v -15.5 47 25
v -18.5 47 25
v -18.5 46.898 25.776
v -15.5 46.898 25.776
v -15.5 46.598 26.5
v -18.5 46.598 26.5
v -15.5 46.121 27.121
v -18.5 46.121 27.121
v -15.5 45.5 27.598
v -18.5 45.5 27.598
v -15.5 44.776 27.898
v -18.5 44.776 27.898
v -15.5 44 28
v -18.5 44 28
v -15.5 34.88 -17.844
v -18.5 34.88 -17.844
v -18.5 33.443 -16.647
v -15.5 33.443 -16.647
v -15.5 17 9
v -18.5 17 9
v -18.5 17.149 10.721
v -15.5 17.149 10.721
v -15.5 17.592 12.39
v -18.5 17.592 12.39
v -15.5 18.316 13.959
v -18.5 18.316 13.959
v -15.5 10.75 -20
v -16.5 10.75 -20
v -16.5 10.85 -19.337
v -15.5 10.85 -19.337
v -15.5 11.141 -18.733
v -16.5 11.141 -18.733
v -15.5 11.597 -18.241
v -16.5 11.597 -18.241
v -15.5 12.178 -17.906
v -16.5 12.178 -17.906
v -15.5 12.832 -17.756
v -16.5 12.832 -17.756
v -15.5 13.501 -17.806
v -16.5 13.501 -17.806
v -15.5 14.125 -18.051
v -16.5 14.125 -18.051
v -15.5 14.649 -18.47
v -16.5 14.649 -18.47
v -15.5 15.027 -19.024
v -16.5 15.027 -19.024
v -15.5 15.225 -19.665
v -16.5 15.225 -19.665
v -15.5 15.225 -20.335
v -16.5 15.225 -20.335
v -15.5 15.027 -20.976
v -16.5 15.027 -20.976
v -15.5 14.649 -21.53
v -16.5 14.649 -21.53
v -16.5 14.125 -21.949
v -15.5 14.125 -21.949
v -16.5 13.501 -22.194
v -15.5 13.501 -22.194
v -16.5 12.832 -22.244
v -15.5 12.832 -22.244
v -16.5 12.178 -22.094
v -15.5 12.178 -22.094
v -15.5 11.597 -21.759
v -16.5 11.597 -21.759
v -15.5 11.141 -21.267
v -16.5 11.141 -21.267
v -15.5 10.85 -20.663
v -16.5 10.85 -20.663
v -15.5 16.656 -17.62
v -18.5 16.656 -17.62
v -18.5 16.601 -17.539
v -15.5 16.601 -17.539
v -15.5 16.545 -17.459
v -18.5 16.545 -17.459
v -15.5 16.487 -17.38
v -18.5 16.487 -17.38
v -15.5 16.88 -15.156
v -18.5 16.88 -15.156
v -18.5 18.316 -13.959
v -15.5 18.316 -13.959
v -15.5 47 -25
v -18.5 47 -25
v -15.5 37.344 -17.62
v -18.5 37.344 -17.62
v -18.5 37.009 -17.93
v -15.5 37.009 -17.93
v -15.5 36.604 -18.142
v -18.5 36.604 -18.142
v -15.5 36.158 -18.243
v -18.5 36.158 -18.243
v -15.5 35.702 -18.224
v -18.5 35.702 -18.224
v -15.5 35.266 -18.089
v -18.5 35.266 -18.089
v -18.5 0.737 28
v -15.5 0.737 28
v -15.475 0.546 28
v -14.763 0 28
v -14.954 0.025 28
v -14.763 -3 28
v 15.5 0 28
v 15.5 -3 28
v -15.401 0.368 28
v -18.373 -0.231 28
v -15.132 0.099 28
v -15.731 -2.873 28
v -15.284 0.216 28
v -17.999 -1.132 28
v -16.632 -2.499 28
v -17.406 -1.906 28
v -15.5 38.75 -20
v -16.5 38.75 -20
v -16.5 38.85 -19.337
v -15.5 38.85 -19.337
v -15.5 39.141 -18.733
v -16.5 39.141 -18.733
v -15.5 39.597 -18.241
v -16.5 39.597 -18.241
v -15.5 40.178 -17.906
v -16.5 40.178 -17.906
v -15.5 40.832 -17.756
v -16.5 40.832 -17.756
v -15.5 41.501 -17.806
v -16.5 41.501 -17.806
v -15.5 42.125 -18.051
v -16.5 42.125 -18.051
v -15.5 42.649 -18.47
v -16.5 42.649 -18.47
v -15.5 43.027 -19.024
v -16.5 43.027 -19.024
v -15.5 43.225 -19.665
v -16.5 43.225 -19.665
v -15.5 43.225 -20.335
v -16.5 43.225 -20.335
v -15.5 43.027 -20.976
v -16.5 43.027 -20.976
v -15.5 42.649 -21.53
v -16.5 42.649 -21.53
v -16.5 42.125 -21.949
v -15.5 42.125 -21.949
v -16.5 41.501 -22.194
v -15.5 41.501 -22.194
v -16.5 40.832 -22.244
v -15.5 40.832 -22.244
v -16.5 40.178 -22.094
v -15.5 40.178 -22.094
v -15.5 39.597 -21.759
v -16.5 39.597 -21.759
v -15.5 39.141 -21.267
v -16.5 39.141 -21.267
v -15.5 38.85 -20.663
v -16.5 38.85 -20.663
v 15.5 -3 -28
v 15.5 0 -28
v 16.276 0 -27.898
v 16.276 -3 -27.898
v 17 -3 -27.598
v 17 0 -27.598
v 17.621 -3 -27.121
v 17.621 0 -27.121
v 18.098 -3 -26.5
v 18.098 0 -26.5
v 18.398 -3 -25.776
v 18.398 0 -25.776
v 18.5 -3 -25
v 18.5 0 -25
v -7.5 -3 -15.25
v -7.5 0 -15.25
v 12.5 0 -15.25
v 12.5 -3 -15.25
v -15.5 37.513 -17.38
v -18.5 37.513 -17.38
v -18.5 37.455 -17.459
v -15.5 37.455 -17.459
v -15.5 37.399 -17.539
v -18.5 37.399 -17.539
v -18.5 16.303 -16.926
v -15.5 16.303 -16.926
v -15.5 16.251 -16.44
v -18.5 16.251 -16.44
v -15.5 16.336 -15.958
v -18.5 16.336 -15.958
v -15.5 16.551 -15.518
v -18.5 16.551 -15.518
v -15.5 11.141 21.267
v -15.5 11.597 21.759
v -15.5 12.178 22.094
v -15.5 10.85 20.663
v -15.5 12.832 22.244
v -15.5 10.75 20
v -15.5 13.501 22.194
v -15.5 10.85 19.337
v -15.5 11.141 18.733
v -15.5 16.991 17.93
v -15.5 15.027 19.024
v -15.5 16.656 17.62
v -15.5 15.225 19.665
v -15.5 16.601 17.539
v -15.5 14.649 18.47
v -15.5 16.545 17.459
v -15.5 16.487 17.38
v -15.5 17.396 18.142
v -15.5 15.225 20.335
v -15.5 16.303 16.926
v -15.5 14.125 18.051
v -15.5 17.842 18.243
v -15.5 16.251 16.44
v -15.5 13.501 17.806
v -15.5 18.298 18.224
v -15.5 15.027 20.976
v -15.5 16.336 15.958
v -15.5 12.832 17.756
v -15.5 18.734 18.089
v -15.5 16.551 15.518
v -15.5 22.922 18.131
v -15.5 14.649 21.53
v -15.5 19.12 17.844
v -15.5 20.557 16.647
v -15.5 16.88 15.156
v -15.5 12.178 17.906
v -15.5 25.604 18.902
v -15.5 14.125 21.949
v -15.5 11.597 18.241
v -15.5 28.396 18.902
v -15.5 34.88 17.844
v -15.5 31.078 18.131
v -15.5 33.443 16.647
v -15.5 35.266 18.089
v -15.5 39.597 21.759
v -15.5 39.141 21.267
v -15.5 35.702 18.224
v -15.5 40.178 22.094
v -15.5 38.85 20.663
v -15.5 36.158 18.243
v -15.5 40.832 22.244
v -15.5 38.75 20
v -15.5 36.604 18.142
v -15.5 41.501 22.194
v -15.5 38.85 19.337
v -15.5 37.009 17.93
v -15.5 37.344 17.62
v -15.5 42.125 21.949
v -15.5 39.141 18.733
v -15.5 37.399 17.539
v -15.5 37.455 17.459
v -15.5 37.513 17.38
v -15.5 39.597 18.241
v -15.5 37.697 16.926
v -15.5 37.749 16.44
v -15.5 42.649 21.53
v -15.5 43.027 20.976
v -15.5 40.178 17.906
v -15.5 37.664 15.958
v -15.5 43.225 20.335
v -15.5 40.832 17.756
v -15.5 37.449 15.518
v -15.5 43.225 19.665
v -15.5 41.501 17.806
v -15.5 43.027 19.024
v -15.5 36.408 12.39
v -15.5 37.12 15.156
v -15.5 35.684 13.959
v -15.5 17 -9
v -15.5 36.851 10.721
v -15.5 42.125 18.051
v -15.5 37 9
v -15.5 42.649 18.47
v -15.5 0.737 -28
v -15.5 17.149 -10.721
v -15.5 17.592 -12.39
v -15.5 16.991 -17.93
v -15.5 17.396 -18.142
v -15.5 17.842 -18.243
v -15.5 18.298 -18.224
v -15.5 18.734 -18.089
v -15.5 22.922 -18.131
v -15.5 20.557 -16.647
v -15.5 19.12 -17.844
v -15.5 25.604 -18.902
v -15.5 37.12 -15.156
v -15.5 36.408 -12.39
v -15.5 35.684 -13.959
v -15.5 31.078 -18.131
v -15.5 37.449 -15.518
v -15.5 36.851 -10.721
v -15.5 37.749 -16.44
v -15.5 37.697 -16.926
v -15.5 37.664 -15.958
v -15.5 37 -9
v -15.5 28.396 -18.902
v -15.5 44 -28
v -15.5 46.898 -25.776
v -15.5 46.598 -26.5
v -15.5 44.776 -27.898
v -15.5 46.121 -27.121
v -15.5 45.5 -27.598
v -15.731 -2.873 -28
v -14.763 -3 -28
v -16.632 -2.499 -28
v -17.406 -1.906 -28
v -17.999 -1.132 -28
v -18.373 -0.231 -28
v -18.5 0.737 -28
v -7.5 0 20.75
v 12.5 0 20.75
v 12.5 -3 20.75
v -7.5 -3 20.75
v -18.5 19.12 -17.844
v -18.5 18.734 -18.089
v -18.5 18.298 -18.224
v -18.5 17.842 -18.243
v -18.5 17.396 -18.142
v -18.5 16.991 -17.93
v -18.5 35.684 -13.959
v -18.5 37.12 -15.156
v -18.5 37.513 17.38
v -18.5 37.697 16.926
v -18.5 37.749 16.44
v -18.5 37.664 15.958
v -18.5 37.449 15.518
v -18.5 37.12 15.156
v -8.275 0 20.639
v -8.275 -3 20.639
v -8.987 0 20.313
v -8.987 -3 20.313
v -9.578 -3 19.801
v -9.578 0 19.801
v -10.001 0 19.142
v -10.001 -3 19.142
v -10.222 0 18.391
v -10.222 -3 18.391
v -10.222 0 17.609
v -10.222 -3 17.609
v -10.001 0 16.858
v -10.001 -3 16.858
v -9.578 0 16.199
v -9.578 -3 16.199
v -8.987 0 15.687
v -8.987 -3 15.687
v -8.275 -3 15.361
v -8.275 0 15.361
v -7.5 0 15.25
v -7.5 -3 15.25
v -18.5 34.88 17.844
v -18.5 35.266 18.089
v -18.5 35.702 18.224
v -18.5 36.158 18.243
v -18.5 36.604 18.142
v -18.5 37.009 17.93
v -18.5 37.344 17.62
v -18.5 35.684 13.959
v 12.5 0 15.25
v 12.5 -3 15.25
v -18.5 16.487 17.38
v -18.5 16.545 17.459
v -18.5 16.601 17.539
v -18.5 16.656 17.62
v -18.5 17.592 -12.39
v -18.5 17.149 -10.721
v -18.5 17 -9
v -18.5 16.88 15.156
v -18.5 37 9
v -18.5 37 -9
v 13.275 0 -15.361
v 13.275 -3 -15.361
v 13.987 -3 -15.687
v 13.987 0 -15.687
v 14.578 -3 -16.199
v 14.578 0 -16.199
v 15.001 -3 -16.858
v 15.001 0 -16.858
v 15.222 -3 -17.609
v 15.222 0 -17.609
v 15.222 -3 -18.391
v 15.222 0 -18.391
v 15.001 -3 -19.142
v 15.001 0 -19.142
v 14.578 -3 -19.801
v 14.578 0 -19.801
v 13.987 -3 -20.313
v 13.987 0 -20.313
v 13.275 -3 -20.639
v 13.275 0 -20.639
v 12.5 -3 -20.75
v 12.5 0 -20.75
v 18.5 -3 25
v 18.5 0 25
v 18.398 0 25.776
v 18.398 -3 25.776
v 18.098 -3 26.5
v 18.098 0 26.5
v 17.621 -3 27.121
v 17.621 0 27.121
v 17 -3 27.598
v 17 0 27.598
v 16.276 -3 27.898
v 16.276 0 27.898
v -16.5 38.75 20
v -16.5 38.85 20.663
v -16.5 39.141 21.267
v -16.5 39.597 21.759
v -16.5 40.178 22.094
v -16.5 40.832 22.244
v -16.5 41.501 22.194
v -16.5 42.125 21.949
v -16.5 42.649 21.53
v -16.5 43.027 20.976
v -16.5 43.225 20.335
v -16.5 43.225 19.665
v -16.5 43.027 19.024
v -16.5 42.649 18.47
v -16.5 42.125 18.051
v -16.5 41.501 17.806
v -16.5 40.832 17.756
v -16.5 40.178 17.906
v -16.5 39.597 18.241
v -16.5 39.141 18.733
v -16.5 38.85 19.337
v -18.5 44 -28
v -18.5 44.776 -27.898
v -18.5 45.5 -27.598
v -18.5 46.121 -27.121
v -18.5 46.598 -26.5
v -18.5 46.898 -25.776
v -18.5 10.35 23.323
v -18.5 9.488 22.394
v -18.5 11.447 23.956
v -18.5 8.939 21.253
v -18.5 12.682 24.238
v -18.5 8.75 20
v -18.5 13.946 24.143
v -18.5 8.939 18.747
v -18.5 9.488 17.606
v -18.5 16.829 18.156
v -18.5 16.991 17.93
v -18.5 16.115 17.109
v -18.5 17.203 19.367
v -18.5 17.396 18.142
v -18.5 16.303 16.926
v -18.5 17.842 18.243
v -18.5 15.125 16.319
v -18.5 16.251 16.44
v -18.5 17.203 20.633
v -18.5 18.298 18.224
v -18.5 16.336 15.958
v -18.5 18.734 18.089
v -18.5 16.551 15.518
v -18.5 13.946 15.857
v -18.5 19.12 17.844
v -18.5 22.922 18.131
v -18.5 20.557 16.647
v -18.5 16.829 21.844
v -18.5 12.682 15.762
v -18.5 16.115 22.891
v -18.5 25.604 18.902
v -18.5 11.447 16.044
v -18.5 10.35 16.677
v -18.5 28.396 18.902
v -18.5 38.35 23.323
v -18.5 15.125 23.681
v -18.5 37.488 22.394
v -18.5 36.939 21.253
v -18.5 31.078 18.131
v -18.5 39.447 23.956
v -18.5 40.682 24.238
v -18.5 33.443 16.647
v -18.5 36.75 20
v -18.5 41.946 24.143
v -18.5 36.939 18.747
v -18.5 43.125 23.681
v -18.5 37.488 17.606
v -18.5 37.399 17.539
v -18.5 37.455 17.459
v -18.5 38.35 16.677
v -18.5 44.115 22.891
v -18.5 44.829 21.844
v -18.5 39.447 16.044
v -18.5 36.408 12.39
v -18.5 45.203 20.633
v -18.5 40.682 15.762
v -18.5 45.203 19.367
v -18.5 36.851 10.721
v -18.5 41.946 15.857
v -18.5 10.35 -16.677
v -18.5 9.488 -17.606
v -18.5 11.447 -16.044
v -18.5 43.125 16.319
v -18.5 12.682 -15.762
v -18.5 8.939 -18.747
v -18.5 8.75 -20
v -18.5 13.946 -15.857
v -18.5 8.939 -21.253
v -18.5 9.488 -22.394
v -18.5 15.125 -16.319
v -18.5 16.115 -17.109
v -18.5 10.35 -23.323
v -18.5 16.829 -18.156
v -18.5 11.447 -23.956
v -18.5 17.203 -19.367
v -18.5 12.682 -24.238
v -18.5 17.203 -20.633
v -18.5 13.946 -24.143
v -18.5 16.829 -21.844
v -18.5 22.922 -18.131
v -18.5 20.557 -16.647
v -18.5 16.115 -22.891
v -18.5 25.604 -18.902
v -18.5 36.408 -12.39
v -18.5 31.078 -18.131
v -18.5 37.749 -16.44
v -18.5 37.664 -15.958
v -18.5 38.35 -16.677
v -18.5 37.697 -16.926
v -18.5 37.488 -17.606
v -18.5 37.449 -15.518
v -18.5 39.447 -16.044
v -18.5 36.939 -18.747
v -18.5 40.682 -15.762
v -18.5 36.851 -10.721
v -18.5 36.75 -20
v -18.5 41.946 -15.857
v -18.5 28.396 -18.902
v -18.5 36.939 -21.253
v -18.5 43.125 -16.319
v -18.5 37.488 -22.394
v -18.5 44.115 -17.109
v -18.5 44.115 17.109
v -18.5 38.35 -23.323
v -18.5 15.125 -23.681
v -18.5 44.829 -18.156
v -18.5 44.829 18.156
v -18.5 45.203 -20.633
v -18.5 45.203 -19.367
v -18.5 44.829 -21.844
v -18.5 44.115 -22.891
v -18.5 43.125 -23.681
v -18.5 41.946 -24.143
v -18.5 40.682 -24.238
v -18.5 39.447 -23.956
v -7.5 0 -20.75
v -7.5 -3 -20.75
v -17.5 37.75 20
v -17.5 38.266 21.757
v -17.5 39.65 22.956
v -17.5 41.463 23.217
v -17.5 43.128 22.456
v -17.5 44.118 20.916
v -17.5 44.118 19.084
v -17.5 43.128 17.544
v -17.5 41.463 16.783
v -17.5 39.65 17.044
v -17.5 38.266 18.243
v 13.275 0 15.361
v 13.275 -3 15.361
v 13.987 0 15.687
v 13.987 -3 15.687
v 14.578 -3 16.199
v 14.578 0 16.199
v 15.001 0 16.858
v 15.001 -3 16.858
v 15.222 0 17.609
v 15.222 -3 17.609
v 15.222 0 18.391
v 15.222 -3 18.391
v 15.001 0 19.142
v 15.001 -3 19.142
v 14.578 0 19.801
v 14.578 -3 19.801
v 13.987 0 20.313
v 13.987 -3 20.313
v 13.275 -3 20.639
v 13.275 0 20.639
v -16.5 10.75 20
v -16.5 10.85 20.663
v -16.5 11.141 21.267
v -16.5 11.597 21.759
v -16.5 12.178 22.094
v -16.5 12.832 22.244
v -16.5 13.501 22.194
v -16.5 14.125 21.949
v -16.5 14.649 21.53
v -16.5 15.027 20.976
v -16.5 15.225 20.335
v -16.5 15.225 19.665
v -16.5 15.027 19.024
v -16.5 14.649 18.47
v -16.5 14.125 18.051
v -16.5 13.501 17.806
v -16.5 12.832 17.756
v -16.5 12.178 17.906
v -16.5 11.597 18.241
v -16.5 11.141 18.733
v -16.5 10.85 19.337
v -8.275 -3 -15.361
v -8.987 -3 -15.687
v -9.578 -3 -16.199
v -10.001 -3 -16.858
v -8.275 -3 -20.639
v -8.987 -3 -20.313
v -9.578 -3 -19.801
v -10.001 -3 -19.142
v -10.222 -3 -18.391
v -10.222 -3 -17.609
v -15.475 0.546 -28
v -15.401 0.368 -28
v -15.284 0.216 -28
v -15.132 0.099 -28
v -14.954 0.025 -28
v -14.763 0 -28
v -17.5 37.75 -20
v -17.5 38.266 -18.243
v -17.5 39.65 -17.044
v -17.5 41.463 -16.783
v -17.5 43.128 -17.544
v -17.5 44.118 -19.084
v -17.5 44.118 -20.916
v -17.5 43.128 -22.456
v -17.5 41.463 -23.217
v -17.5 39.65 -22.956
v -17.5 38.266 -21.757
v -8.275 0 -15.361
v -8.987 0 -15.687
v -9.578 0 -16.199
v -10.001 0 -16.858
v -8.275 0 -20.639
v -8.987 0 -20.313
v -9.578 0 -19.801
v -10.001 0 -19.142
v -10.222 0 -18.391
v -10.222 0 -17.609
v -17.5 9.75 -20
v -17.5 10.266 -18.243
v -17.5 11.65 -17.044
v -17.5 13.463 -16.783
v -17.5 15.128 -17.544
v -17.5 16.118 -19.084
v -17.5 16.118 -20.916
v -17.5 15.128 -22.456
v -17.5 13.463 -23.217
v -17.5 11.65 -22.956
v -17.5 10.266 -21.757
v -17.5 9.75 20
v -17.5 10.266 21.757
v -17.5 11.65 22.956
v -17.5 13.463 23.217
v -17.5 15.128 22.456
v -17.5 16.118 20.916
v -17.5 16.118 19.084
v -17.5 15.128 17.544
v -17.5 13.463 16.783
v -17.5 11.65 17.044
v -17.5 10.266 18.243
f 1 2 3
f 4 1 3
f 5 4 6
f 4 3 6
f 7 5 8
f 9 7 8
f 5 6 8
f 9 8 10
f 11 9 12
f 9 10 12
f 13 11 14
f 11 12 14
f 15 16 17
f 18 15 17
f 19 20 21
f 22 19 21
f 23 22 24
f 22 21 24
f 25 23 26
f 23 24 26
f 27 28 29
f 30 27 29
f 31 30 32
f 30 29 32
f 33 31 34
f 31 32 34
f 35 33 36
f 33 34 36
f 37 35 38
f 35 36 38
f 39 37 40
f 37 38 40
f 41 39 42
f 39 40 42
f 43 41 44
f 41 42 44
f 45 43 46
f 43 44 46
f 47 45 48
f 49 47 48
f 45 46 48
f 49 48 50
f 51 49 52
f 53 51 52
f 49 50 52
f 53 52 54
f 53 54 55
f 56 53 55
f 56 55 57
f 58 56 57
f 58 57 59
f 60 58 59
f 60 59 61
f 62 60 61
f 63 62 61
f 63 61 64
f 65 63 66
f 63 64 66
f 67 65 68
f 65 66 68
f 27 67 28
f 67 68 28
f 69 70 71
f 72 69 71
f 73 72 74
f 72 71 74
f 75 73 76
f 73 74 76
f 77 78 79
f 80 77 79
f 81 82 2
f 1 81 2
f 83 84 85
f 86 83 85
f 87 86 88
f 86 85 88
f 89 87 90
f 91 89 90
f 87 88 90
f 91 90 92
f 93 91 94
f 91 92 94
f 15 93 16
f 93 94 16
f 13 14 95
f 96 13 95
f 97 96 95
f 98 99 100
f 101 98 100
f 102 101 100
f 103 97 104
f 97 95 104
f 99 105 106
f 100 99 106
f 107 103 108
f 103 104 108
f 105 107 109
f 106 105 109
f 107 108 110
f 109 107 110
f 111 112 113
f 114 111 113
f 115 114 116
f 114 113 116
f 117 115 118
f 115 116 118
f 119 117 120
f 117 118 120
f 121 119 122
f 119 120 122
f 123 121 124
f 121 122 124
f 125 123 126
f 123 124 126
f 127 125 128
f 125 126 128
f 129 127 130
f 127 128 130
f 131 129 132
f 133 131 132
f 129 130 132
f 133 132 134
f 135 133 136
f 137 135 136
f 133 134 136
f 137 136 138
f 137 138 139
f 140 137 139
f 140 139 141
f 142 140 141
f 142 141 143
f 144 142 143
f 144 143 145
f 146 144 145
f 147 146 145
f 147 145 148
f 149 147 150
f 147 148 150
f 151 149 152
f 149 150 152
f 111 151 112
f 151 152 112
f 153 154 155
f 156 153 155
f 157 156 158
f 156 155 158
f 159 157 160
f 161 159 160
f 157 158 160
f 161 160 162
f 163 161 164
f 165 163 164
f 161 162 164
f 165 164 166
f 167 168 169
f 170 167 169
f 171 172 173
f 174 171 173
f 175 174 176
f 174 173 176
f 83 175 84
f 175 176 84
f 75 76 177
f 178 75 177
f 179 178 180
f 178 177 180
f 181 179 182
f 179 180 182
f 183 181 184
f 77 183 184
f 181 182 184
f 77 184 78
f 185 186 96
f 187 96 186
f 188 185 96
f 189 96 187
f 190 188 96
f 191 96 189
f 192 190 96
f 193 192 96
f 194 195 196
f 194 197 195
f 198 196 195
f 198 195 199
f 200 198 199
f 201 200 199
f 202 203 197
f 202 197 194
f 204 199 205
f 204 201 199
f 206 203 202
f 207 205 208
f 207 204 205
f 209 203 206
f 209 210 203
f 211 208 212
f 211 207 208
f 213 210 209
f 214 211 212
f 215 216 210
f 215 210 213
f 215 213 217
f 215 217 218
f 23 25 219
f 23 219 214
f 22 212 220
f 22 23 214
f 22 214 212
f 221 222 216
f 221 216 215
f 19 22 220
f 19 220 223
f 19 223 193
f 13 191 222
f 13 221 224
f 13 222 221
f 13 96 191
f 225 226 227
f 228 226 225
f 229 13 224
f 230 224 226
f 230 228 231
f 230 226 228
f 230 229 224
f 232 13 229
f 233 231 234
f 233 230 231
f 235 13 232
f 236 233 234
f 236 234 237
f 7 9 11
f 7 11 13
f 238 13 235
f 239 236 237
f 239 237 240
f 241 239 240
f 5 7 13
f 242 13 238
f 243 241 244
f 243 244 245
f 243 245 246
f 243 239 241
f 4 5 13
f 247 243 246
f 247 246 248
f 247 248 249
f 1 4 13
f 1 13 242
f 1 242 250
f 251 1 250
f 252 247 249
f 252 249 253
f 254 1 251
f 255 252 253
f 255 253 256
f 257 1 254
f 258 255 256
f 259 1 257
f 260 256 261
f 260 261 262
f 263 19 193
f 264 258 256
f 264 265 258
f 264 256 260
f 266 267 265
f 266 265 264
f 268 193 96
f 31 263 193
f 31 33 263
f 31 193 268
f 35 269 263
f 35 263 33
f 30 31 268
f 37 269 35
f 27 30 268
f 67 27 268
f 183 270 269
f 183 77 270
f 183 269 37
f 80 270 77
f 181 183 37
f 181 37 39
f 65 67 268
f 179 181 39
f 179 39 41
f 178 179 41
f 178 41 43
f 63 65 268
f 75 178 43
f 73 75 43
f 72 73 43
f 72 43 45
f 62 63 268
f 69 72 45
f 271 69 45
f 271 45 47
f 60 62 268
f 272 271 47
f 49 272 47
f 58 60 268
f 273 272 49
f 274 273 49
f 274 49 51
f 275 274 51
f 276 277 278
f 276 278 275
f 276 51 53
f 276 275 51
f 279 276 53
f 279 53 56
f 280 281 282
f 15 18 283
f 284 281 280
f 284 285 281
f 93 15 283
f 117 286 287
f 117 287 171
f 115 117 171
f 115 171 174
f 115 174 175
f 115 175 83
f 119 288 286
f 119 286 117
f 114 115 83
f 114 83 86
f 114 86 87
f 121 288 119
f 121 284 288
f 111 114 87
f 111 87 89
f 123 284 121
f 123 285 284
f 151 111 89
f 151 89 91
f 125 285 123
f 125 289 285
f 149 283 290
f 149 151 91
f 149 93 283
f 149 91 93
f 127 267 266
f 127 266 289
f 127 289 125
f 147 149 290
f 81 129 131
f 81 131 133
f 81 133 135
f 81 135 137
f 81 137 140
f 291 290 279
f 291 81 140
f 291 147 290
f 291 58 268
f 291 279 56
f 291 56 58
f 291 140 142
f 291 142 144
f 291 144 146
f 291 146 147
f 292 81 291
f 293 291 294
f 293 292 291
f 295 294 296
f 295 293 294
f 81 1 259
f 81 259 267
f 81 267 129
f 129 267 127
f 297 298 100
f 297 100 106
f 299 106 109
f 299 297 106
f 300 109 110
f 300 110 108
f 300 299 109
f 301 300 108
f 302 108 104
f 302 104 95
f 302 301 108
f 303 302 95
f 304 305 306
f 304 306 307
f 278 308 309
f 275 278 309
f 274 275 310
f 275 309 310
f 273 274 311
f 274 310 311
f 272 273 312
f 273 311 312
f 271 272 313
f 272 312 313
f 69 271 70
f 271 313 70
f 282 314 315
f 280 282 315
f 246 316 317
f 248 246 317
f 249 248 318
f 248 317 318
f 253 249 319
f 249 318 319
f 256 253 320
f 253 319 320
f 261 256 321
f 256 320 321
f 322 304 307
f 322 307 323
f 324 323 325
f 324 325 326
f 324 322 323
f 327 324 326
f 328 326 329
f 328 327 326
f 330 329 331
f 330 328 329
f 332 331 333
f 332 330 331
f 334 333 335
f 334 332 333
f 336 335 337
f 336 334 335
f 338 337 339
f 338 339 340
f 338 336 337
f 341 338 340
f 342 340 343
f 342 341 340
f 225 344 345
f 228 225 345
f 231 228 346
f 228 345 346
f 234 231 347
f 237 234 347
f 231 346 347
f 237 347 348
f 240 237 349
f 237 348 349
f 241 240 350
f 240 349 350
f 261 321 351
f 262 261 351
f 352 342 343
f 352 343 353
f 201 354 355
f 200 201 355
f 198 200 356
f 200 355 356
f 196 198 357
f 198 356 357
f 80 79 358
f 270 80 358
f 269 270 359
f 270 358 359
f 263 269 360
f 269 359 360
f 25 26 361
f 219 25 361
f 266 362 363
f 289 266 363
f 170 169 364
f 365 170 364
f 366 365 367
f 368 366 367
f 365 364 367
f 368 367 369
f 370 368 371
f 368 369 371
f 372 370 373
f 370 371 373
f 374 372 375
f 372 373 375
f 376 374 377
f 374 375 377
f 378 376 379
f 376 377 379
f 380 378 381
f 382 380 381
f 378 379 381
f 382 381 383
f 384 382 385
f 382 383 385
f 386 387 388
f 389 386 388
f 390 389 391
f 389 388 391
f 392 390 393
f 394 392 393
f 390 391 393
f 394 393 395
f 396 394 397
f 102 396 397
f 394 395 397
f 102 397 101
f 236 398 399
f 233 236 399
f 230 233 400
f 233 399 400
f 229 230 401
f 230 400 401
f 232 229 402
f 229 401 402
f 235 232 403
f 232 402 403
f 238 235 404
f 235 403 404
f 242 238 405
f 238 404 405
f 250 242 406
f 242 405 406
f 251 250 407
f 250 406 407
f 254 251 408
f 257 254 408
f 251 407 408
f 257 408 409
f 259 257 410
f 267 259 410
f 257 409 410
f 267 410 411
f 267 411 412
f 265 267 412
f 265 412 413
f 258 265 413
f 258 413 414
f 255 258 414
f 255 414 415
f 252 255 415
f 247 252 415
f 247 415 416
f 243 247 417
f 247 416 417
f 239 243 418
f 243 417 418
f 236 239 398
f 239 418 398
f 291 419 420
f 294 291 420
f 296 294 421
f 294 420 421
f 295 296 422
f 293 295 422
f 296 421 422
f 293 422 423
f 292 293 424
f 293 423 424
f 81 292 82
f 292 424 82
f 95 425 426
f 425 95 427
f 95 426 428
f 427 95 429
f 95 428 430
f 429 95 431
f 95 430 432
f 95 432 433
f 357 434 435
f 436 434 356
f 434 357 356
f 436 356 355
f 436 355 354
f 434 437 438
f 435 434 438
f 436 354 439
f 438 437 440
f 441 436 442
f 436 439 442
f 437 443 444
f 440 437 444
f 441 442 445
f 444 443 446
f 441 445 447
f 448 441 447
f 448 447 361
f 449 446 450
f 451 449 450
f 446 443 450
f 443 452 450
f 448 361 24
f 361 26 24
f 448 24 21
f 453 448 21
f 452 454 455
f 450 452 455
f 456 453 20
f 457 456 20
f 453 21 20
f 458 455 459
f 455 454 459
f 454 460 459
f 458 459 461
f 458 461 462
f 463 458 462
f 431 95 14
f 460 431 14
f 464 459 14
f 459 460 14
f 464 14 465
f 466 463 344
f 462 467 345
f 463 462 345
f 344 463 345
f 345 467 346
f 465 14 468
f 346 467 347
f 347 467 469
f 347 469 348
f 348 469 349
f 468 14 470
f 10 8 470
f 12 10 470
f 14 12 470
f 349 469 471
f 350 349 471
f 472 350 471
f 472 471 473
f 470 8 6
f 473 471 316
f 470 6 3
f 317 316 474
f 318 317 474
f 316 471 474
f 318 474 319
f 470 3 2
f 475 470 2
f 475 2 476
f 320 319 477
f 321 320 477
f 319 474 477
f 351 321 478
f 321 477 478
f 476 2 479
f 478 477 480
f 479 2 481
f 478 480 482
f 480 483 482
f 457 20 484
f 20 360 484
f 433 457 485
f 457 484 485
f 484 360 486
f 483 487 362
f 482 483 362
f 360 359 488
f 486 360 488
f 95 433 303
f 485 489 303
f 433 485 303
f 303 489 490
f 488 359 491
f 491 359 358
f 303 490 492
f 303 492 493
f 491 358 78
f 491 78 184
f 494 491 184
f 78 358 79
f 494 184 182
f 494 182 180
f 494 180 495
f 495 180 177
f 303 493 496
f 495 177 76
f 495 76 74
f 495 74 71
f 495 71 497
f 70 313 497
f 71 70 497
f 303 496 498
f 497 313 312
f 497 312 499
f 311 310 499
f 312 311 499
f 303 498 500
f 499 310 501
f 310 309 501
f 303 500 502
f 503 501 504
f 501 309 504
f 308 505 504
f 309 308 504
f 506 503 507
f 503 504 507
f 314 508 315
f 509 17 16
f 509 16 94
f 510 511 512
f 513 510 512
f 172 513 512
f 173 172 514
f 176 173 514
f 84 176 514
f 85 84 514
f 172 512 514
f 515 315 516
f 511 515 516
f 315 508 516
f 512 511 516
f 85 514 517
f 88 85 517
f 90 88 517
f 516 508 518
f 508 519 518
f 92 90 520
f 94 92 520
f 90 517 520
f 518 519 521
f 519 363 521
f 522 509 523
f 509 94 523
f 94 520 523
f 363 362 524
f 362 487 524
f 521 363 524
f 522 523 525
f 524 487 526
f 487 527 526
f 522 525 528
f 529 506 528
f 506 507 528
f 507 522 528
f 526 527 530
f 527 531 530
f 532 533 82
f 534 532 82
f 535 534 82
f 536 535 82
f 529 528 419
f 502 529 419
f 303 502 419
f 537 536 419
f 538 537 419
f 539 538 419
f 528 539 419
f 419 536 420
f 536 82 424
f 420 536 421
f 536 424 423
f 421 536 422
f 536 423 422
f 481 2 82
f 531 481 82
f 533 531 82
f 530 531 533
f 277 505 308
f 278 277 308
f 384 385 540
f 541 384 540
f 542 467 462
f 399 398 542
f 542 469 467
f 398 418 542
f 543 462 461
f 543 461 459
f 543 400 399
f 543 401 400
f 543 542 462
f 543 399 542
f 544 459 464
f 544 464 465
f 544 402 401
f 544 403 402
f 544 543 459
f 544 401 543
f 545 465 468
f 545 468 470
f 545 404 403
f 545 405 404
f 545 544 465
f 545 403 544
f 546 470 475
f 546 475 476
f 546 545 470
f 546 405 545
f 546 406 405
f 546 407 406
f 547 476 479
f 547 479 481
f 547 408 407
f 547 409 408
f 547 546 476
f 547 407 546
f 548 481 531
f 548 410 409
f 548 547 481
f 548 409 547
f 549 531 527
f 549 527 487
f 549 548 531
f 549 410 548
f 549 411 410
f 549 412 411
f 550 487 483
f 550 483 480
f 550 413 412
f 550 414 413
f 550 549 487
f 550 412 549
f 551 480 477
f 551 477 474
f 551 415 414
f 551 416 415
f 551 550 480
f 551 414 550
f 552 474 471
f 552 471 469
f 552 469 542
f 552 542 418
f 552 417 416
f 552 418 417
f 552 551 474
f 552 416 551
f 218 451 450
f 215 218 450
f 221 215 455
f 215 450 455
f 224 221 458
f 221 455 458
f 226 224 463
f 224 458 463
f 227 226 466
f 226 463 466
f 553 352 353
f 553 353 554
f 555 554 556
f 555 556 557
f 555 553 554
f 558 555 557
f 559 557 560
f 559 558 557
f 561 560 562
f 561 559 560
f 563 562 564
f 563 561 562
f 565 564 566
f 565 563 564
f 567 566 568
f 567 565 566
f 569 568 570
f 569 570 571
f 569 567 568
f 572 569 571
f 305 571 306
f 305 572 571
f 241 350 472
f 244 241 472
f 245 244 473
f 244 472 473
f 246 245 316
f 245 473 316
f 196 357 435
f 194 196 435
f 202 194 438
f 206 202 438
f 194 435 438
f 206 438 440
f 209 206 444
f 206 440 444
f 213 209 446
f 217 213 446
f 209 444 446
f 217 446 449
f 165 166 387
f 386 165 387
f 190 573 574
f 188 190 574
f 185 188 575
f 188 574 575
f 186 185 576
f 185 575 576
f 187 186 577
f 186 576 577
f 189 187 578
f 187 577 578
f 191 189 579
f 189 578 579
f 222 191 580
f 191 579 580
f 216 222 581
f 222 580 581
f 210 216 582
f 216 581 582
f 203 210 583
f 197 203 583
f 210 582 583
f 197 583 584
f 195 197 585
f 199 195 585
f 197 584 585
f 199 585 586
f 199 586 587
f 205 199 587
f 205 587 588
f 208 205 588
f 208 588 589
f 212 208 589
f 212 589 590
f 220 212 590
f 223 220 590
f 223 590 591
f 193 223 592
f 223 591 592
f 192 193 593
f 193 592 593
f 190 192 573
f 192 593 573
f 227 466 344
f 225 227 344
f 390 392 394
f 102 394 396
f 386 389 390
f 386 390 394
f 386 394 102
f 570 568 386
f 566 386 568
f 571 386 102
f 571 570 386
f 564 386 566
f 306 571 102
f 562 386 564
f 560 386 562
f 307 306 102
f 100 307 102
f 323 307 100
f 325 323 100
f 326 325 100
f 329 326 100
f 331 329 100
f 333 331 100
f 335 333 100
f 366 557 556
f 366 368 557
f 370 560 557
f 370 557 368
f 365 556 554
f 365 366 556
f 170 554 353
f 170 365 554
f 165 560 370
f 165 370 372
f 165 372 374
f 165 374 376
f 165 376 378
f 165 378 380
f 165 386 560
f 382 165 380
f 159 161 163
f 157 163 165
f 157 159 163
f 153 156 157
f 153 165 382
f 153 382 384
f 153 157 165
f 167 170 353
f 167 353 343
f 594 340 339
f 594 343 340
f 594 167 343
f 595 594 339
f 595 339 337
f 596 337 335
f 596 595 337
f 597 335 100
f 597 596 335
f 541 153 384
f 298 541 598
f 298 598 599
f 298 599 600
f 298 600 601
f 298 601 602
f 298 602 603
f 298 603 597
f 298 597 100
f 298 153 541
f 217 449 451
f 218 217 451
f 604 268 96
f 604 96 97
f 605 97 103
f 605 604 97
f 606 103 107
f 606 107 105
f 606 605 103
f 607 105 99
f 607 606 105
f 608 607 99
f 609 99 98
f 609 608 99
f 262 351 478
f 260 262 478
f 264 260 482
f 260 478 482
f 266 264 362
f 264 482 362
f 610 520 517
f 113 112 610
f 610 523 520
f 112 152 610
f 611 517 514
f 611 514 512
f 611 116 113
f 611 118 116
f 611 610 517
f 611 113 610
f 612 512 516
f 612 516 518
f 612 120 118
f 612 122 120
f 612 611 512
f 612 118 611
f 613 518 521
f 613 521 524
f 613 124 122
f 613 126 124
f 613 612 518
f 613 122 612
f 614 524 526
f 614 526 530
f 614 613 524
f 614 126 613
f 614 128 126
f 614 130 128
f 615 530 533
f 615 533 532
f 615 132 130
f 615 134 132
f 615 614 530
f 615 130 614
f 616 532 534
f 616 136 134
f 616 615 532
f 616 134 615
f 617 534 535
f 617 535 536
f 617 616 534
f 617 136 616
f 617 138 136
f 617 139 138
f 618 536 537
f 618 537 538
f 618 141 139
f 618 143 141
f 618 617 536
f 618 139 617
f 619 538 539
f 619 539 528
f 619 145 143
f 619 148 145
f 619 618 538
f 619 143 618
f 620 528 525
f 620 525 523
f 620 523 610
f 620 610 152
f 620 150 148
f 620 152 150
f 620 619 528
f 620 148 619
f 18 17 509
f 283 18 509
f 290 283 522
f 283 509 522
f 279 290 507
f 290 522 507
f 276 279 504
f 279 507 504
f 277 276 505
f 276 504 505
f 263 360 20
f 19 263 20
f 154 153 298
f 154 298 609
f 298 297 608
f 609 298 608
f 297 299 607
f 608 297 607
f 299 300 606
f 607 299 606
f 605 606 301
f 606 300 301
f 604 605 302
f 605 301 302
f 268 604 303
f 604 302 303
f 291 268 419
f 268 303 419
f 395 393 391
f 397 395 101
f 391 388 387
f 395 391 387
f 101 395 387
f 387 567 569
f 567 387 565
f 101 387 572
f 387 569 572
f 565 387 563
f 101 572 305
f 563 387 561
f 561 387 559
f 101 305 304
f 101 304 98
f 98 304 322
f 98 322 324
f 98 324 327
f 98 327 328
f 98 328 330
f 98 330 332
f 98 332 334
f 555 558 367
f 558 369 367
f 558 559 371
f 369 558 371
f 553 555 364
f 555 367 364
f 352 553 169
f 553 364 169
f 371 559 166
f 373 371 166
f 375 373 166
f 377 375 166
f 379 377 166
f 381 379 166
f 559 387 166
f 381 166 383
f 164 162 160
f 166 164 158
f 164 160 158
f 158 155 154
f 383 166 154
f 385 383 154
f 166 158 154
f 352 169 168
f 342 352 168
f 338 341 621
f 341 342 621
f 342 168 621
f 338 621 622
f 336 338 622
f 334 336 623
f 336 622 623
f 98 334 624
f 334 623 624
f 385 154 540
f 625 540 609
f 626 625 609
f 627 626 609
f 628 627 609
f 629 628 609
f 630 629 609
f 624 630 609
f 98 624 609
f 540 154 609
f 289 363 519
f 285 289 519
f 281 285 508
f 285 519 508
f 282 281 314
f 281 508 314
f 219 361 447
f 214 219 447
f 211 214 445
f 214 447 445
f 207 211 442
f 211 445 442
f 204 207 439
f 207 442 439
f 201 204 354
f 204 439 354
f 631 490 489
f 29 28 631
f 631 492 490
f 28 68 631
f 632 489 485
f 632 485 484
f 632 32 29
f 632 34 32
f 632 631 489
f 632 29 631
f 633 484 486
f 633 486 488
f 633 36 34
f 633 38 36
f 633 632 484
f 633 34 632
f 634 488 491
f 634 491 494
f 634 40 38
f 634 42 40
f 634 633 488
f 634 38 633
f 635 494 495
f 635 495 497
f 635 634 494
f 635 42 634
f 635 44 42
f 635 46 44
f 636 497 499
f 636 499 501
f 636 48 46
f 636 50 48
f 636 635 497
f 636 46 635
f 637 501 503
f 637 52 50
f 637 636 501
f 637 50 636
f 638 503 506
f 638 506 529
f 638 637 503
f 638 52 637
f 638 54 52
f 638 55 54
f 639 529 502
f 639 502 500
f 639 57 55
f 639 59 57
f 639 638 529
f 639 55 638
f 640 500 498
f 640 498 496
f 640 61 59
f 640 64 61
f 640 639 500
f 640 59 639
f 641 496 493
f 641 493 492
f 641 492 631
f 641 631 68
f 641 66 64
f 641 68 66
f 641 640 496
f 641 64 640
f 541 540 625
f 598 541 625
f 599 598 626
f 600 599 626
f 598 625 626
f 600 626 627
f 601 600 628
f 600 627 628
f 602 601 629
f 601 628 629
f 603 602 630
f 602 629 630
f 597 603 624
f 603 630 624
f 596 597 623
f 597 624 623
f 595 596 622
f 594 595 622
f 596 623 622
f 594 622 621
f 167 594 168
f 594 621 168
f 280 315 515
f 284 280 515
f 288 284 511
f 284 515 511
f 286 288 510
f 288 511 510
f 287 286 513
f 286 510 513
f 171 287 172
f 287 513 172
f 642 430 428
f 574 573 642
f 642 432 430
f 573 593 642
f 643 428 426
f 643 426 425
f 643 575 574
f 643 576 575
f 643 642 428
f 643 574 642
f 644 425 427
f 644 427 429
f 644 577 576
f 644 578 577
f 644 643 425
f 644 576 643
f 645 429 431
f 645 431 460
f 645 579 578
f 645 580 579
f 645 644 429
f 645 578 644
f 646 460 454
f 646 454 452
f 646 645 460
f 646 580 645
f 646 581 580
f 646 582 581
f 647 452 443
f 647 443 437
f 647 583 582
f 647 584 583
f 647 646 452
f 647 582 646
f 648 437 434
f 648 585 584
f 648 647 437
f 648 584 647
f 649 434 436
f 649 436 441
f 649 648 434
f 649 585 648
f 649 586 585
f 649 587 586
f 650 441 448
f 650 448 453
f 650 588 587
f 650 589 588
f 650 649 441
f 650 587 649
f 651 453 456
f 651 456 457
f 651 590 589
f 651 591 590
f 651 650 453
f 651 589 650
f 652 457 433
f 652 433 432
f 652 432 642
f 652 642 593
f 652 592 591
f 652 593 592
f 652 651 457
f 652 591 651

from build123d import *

# Parameters (mm, degrees)
BASE_FLANGE1_DEPTH           = 3
EDGE_FLANGE1_STRIP_W         = 13.4732
EDGE_FLANGE1_STRIP_H         = 3
EDGE_FLANGE1_STRIP_CUT_DEPTH = 56
EDGE_FLANGE1_DEPTH           = 56
EDGE_FLANGE1_FLAT_DEPTH      = 3
SKETCH5_R                    = 2.25
CUT_EXTRUDE1_DEPTH           = 3
CHAMFER1_SIZE                = 2


# Sheet-metal steps are written as plain solids
with BuildPart() as part:
    # Sketch1 → Base-Flange1 (new body)
    with BuildSketch(Plane(origin=(0, 0, 0), x_dir=(1, 0, 0), z_dir=(0, 1, 0))):
        with BuildLine():
            Line((-18.5, 28), (15.5, 28))
            ThreePointArc((15.5, 28), (17.621320344, 27.121320344), (18.5, 25))
            Line((18.5, 25), (18.5, -25))
            ThreePointArc((18.5, -25), (17.621320344, -27.121320344), (15.5, -28))
            Line((15.5, -28), (-18.5, -28))
            Line((-18.5, -28), (-18.5, 28))
        make_face()
        with BuildLine():
            Line((-7.5, -15.25), (12.5, -15.25))
            ThreePointArc((12.5, -15.25), (15.25, -18), (12.5, -20.75))
            Line((12.5, -20.75), (-7.5, -20.75))
            ThreePointArc((-7.5, -20.75), (-10.25, -18), (-7.5, -15.25))
        make_face(mode=Mode.SUBTRACT)
        with BuildLine():
            Line((-7.5, 15.25), (12.5, 15.25))
            ThreePointArc((12.5, 15.25), (15.25, 18), (12.5, 20.75))
            Line((12.5, 20.75), (-7.5, 20.75))
            ThreePointArc((-7.5, 20.75), (-10.25, 18), (-7.5, 15.25))
        make_face(mode=Mode.SUBTRACT)
    extrude(amount=-BASE_FLANGE1_DEPTH)

    # Edge-Flange1 strip (across the edge) → Edge-Flange1 strip cut (cut)
    with BuildSketch(Plane(origin=(-18.5, 0, -28), x_dir=(1, 0, 0), z_dir=(0, 0, 1))):
        with Locations((-3, -1.5)):
            Rectangle(EDGE_FLANGE1_STRIP_W, EDGE_FLANGE1_STRIP_H)
    extrude(amount=EDGE_FLANGE1_STRIP_CUT_DEPTH, mode=Mode.SUBTRACT)

    # Edge-Flange1 bend section (across the edge) → Edge-Flange1 (add)
    with BuildSketch(Plane(origin=(-18.5, 0, -28), x_dir=(1, 0, 0), z_dir=(0, 0, 1))):
        with BuildLine():
            Line((0, 0.7366), (3, 0.7366))
            ThreePointArc((3, 0.7366), (3.215745145, 0.215745145), (3.7366, 0))
            Line((3.7366, 0), (3.7366, -3))
            ThreePointArc((3.7366, -3), (1.094424801, -1.905575199), (0, 0.7366))
        make_face()
    extrude(amount=EDGE_FLANGE1_DEPTH)

    # Edge-Flange1 profile (on flange) → Edge-Flange1 flat (add)
    with BuildSketch(Plane(origin=(-18.5, 0, 0), x_dir=(0, 0, -1), z_dir=(1, 0, 0))):
        with BuildLine():
            Line((-28, 0.7366), (28, 0.7366))
            Line((28, 0.7366), (28, 44))
            ThreePointArc((28, 44), (27.121320344, 46.121320344), (25, 47))
            Line((25, 47), (-25, 47))
            ThreePointArc((-25, 47), (-27.121320344, 46.121320344), (-28, 44))
            Line((-28, 44), (-28, 0.7366))
        make_face()
    extrude(amount=EDGE_FLANGE1_FLAT_DEPTH)

    # Sketch5 → Cut-Extrude1 (cut)
    with BuildSketch(Plane.ZY.offset(18.5)):
        with BuildLine():
            Line((9, 37), (-9, 37))
            ThreePointArc((-9, 37), (-11.565163819, 36.665398832), (-13.958666275, 35.683986917))
            Line((-13.958666275, 35.683986917), (-15.155612761, 37.120322699))
            ThreePointArc((-15.155612761, 37.120322699), (-16.195875666, 37.723371228), (-17.379716482, 37.512811591))
            ThreePointArc((-17.379716482, 37.512811591), (-17.498601644, 37.426573777), (-17.620322699, 37.344387239))
            ThreePointArc((-17.620322699, 37.344387239), (-18.242813111, 36.158437556), (-17.844387239, 34.879677301))
            Line((-17.844387239, 34.879677301), (-16.647440754, 33.443341518))
            ThreePointArc((-16.647440754, 33.443341518), (-19, 27), (-16.647440754, 20.556658482))
            Line((-16.647440754, 20.556658482), (-17.844387239, 19.120322699))
            ThreePointArc((-17.844387239, 19.120322699), (-18.242813111, 17.841562444), (-17.620322699, 16.655612761))
            ThreePointArc((-17.620322699, 16.655612761), (-17.498601644, 16.573426223), (-17.379716482, 16.487188409))
            ThreePointArc((-17.379716482, 16.487188409), (-16.195875666, 16.276628772), (-15.155612761, 16.879677301))
            Line((-15.155612761, 16.879677301), (-13.958666275, 18.316013083))
            ThreePointArc((-13.958666275, 18.316013083), (-11.565163819, 17.334601168), (-9, 17))
            Line((-9, 17), (9, 17))
            ThreePointArc((9, 17), (11.565163819, 17.334601168), (13.958666275, 18.316013083))
            Line((13.958666275, 18.316013083), (15.155612761, 16.879677301))
            ThreePointArc((15.155612761, 16.879677301), (16.195875666, 16.276628772), (17.379716482, 16.487188409))
            ThreePointArc((17.379716482, 16.487188409), (17.498601644, 16.573426223), (17.620322699, 16.655612761))
            ThreePointArc((17.620322699, 16.655612761), (18.242813111, 17.841562444), (17.844387239, 19.120322699))
            Line((17.844387239, 19.120322699), (16.647440754, 20.556658482))
            ThreePointArc((16.647440754, 20.556658482), (19, 27), (16.647440754, 33.443341518))
            Line((16.647440754, 33.443341518), (17.844387239, 34.879677301))
            ThreePointArc((17.844387239, 34.879677301), (18.242813111, 36.158437556), (17.620322699, 37.344387239))
            ThreePointArc((17.620322699, 37.344387239), (17.498601644, 37.426573777), (17.379716482, 37.512811591))
            ThreePointArc((17.379716482, 37.512811591), (16.195875666, 37.723371228), (15.155612761, 37.120322699))
            Line((15.155612761, 37.120322699), (13.958666275, 35.683986917))
            ThreePointArc((13.958666275, 35.683986917), (11.565163819, 36.665398832), (9, 37))
        make_face()
        with Locations(Location((20, 41, 0), (0, 0, 270))):
            Circle(SKETCH5_R)
        with Locations(Location((-20, 41, 0), (0, 0, 270))):
            Circle(SKETCH5_R)
        with Locations(Location((-20, 13, 0), (0, 0, 270))):
            Circle(SKETCH5_R)
        with Locations(Location((20, 13, 0), (0, 0, 270))):
            Circle(SKETCH5_R)
    extrude(amount=-CUT_EXTRUDE1_DEPTH, mode=Mode.SUBTRACT)

    # Chamfer1
    chamfer1_edges = [part.edges().sort_by_distance(p)[0] for p in [
        (-18.5, 15.25, -20),
        (-18.5, 15.25, 20),
        (-18.5, 43.25, 20),
        (-18.5, 43.25, -20),
    ]]
    chamfer(chamfer1_edges, length=CHAMFER1_SIZE)


solid = part.part
